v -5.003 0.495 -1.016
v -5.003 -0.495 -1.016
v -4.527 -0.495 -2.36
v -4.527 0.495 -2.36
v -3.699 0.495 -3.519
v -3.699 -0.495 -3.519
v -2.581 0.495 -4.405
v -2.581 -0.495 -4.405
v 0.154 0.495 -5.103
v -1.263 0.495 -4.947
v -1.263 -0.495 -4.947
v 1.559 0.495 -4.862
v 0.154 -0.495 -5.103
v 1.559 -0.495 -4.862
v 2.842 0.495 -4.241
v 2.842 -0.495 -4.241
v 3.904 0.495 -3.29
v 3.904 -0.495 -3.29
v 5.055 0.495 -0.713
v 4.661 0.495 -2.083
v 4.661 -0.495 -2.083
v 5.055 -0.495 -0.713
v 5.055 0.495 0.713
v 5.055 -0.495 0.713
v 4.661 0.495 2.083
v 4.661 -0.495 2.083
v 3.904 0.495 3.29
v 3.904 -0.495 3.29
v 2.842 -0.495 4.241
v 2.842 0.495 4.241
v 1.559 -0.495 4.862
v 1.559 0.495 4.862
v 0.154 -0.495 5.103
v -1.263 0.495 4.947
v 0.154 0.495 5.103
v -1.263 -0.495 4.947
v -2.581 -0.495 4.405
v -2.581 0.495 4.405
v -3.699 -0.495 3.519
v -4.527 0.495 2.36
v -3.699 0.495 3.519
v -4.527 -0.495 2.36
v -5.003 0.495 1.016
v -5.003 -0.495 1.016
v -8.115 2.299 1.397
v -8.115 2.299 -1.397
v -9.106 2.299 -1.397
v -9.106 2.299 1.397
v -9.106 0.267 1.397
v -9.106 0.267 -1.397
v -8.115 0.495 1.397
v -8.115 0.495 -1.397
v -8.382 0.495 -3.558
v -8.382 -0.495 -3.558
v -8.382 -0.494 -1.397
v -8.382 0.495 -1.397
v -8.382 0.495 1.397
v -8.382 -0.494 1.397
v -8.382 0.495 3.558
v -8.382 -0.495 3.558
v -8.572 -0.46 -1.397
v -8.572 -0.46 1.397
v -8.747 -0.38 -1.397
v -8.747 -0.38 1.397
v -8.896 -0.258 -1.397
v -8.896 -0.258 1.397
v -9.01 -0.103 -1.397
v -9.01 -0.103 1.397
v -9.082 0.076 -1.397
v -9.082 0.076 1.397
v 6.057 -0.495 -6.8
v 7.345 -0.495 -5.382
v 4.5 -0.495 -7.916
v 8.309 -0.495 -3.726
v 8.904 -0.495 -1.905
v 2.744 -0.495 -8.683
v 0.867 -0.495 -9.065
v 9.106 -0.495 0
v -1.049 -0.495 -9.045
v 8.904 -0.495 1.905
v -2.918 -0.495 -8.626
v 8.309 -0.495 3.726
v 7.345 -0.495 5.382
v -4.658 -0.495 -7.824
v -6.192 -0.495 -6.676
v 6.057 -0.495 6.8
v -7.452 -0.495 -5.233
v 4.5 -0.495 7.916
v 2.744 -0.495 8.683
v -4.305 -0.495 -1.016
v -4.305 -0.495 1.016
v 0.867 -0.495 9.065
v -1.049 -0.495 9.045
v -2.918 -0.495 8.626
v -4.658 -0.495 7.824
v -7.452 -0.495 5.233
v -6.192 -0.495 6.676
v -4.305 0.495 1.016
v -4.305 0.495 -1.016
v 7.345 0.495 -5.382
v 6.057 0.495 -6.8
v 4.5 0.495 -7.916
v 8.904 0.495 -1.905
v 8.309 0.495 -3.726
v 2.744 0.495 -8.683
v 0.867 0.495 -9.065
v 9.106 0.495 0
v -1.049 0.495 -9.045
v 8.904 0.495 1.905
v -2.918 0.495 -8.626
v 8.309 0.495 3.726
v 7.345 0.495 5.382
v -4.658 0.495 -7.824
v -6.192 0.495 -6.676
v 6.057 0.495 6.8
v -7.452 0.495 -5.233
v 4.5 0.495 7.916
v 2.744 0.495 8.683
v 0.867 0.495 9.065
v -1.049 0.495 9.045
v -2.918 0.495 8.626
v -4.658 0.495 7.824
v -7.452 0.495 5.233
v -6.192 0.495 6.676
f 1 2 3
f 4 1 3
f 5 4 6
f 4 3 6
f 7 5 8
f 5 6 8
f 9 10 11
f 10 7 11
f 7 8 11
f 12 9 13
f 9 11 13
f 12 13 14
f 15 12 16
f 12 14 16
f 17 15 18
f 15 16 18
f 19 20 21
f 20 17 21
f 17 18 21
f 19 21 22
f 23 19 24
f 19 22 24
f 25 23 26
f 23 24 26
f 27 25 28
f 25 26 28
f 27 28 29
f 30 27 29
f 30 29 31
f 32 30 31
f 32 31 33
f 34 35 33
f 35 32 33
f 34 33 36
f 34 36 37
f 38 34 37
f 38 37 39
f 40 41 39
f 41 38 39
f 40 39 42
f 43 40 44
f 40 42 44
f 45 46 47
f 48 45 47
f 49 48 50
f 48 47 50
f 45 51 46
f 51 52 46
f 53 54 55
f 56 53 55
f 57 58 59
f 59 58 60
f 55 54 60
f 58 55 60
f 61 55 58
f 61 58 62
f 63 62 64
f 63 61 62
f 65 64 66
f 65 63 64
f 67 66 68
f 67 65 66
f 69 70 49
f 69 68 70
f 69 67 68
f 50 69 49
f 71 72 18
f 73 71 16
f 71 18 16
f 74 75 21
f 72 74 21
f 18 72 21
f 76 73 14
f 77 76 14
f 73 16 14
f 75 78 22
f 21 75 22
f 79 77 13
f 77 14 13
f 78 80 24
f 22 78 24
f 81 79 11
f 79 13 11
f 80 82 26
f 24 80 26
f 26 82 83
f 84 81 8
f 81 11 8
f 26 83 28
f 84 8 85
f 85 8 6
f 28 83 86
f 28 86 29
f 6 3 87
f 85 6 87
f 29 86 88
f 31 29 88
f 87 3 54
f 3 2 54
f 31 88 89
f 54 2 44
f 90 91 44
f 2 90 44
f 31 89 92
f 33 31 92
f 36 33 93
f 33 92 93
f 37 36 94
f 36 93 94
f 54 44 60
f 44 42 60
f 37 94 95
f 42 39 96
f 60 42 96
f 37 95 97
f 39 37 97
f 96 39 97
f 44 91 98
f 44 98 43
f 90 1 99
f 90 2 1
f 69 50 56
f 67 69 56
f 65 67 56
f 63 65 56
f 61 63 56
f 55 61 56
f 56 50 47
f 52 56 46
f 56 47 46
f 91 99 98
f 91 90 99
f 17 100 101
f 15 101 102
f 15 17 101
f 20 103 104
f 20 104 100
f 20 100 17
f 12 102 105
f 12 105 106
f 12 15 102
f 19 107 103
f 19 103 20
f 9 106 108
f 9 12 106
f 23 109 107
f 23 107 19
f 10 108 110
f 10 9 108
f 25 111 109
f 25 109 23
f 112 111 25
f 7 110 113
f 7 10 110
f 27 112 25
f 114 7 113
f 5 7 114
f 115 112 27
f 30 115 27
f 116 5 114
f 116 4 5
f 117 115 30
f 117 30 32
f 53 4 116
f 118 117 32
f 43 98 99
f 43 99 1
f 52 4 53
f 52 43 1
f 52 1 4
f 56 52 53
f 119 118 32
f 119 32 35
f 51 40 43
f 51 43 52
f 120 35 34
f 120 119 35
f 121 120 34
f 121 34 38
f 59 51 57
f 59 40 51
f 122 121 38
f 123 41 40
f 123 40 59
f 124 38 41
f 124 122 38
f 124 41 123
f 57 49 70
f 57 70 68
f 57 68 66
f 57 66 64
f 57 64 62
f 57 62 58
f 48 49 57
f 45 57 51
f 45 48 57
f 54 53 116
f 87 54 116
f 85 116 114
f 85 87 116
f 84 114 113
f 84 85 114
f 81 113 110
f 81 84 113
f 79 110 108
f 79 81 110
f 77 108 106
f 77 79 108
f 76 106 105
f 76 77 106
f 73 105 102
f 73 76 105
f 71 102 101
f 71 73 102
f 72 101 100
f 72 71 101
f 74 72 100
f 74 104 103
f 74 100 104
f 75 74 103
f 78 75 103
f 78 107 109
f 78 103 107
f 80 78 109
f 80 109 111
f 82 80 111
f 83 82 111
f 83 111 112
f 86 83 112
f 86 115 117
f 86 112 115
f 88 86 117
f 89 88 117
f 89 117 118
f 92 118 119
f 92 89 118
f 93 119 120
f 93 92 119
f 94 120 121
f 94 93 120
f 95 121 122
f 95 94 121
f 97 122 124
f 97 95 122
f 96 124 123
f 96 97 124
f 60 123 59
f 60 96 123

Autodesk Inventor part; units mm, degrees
sketch "Sketch_1" plane through (0, 0, 0) normal (0, 1, 0) x (-1, 0, 0)
  line L0 (8.382, -3.558) -> (8.382, 3.558)
  arc A0 (8.382, 3.558) -> (8.382, -3.558) centre (0, 0) ccw
  arc A1 (5.0033, 1.016) -> (5.0033, -1.016) centre (0, 0) ccw
  line L1 (5.0033, -1.016) -> (4.3053, -1.016)
  line L2 (4.3053, -1.016) -> (4.3053, 1.016)
  line L3 (4.3053, 1.016) -> (5.0033, 1.016)
extrude "Extrusion1" add sketch "Sketch_1" along normal mid plane 0.9906
sketch "Sketch_2" plane through (0, 0, 0) normal (0, 0, 1) x (1, 0, 0)
  arc A0 (-9.1059, 0.2667) -> (-8.3439, -0.4953) centre (-8.3439, 0.2667) ccw
  line L0 (-8.3439, -0.4953) -> (-8.1153, -0.4953)
  line L1 (-8.1153, -0.4953) -> (-8.1153, 2.2987)
  line L2 (-8.1153, 2.2987) -> (-9.1059, 2.2987)
  line L3 (-9.1059, 2.2987) -> (-9.1059, 0.2667)
extrude "Extrusion2" add sketch "Sketch_2" along normal mid plane 2.794
ref_plane "1_XY" through (0, 0, 0) normal (0, 1, 0) x (1, 0, 0)
ref_plane "1_YZ" through (0, 0, 0) normal (1, 0, 0) x (0, 0, -1)
ref_plane "1_ZX" through (0, 0, 0) normal (0, 0, -1) x (0, 1, 0)
properties part number "AT518"
